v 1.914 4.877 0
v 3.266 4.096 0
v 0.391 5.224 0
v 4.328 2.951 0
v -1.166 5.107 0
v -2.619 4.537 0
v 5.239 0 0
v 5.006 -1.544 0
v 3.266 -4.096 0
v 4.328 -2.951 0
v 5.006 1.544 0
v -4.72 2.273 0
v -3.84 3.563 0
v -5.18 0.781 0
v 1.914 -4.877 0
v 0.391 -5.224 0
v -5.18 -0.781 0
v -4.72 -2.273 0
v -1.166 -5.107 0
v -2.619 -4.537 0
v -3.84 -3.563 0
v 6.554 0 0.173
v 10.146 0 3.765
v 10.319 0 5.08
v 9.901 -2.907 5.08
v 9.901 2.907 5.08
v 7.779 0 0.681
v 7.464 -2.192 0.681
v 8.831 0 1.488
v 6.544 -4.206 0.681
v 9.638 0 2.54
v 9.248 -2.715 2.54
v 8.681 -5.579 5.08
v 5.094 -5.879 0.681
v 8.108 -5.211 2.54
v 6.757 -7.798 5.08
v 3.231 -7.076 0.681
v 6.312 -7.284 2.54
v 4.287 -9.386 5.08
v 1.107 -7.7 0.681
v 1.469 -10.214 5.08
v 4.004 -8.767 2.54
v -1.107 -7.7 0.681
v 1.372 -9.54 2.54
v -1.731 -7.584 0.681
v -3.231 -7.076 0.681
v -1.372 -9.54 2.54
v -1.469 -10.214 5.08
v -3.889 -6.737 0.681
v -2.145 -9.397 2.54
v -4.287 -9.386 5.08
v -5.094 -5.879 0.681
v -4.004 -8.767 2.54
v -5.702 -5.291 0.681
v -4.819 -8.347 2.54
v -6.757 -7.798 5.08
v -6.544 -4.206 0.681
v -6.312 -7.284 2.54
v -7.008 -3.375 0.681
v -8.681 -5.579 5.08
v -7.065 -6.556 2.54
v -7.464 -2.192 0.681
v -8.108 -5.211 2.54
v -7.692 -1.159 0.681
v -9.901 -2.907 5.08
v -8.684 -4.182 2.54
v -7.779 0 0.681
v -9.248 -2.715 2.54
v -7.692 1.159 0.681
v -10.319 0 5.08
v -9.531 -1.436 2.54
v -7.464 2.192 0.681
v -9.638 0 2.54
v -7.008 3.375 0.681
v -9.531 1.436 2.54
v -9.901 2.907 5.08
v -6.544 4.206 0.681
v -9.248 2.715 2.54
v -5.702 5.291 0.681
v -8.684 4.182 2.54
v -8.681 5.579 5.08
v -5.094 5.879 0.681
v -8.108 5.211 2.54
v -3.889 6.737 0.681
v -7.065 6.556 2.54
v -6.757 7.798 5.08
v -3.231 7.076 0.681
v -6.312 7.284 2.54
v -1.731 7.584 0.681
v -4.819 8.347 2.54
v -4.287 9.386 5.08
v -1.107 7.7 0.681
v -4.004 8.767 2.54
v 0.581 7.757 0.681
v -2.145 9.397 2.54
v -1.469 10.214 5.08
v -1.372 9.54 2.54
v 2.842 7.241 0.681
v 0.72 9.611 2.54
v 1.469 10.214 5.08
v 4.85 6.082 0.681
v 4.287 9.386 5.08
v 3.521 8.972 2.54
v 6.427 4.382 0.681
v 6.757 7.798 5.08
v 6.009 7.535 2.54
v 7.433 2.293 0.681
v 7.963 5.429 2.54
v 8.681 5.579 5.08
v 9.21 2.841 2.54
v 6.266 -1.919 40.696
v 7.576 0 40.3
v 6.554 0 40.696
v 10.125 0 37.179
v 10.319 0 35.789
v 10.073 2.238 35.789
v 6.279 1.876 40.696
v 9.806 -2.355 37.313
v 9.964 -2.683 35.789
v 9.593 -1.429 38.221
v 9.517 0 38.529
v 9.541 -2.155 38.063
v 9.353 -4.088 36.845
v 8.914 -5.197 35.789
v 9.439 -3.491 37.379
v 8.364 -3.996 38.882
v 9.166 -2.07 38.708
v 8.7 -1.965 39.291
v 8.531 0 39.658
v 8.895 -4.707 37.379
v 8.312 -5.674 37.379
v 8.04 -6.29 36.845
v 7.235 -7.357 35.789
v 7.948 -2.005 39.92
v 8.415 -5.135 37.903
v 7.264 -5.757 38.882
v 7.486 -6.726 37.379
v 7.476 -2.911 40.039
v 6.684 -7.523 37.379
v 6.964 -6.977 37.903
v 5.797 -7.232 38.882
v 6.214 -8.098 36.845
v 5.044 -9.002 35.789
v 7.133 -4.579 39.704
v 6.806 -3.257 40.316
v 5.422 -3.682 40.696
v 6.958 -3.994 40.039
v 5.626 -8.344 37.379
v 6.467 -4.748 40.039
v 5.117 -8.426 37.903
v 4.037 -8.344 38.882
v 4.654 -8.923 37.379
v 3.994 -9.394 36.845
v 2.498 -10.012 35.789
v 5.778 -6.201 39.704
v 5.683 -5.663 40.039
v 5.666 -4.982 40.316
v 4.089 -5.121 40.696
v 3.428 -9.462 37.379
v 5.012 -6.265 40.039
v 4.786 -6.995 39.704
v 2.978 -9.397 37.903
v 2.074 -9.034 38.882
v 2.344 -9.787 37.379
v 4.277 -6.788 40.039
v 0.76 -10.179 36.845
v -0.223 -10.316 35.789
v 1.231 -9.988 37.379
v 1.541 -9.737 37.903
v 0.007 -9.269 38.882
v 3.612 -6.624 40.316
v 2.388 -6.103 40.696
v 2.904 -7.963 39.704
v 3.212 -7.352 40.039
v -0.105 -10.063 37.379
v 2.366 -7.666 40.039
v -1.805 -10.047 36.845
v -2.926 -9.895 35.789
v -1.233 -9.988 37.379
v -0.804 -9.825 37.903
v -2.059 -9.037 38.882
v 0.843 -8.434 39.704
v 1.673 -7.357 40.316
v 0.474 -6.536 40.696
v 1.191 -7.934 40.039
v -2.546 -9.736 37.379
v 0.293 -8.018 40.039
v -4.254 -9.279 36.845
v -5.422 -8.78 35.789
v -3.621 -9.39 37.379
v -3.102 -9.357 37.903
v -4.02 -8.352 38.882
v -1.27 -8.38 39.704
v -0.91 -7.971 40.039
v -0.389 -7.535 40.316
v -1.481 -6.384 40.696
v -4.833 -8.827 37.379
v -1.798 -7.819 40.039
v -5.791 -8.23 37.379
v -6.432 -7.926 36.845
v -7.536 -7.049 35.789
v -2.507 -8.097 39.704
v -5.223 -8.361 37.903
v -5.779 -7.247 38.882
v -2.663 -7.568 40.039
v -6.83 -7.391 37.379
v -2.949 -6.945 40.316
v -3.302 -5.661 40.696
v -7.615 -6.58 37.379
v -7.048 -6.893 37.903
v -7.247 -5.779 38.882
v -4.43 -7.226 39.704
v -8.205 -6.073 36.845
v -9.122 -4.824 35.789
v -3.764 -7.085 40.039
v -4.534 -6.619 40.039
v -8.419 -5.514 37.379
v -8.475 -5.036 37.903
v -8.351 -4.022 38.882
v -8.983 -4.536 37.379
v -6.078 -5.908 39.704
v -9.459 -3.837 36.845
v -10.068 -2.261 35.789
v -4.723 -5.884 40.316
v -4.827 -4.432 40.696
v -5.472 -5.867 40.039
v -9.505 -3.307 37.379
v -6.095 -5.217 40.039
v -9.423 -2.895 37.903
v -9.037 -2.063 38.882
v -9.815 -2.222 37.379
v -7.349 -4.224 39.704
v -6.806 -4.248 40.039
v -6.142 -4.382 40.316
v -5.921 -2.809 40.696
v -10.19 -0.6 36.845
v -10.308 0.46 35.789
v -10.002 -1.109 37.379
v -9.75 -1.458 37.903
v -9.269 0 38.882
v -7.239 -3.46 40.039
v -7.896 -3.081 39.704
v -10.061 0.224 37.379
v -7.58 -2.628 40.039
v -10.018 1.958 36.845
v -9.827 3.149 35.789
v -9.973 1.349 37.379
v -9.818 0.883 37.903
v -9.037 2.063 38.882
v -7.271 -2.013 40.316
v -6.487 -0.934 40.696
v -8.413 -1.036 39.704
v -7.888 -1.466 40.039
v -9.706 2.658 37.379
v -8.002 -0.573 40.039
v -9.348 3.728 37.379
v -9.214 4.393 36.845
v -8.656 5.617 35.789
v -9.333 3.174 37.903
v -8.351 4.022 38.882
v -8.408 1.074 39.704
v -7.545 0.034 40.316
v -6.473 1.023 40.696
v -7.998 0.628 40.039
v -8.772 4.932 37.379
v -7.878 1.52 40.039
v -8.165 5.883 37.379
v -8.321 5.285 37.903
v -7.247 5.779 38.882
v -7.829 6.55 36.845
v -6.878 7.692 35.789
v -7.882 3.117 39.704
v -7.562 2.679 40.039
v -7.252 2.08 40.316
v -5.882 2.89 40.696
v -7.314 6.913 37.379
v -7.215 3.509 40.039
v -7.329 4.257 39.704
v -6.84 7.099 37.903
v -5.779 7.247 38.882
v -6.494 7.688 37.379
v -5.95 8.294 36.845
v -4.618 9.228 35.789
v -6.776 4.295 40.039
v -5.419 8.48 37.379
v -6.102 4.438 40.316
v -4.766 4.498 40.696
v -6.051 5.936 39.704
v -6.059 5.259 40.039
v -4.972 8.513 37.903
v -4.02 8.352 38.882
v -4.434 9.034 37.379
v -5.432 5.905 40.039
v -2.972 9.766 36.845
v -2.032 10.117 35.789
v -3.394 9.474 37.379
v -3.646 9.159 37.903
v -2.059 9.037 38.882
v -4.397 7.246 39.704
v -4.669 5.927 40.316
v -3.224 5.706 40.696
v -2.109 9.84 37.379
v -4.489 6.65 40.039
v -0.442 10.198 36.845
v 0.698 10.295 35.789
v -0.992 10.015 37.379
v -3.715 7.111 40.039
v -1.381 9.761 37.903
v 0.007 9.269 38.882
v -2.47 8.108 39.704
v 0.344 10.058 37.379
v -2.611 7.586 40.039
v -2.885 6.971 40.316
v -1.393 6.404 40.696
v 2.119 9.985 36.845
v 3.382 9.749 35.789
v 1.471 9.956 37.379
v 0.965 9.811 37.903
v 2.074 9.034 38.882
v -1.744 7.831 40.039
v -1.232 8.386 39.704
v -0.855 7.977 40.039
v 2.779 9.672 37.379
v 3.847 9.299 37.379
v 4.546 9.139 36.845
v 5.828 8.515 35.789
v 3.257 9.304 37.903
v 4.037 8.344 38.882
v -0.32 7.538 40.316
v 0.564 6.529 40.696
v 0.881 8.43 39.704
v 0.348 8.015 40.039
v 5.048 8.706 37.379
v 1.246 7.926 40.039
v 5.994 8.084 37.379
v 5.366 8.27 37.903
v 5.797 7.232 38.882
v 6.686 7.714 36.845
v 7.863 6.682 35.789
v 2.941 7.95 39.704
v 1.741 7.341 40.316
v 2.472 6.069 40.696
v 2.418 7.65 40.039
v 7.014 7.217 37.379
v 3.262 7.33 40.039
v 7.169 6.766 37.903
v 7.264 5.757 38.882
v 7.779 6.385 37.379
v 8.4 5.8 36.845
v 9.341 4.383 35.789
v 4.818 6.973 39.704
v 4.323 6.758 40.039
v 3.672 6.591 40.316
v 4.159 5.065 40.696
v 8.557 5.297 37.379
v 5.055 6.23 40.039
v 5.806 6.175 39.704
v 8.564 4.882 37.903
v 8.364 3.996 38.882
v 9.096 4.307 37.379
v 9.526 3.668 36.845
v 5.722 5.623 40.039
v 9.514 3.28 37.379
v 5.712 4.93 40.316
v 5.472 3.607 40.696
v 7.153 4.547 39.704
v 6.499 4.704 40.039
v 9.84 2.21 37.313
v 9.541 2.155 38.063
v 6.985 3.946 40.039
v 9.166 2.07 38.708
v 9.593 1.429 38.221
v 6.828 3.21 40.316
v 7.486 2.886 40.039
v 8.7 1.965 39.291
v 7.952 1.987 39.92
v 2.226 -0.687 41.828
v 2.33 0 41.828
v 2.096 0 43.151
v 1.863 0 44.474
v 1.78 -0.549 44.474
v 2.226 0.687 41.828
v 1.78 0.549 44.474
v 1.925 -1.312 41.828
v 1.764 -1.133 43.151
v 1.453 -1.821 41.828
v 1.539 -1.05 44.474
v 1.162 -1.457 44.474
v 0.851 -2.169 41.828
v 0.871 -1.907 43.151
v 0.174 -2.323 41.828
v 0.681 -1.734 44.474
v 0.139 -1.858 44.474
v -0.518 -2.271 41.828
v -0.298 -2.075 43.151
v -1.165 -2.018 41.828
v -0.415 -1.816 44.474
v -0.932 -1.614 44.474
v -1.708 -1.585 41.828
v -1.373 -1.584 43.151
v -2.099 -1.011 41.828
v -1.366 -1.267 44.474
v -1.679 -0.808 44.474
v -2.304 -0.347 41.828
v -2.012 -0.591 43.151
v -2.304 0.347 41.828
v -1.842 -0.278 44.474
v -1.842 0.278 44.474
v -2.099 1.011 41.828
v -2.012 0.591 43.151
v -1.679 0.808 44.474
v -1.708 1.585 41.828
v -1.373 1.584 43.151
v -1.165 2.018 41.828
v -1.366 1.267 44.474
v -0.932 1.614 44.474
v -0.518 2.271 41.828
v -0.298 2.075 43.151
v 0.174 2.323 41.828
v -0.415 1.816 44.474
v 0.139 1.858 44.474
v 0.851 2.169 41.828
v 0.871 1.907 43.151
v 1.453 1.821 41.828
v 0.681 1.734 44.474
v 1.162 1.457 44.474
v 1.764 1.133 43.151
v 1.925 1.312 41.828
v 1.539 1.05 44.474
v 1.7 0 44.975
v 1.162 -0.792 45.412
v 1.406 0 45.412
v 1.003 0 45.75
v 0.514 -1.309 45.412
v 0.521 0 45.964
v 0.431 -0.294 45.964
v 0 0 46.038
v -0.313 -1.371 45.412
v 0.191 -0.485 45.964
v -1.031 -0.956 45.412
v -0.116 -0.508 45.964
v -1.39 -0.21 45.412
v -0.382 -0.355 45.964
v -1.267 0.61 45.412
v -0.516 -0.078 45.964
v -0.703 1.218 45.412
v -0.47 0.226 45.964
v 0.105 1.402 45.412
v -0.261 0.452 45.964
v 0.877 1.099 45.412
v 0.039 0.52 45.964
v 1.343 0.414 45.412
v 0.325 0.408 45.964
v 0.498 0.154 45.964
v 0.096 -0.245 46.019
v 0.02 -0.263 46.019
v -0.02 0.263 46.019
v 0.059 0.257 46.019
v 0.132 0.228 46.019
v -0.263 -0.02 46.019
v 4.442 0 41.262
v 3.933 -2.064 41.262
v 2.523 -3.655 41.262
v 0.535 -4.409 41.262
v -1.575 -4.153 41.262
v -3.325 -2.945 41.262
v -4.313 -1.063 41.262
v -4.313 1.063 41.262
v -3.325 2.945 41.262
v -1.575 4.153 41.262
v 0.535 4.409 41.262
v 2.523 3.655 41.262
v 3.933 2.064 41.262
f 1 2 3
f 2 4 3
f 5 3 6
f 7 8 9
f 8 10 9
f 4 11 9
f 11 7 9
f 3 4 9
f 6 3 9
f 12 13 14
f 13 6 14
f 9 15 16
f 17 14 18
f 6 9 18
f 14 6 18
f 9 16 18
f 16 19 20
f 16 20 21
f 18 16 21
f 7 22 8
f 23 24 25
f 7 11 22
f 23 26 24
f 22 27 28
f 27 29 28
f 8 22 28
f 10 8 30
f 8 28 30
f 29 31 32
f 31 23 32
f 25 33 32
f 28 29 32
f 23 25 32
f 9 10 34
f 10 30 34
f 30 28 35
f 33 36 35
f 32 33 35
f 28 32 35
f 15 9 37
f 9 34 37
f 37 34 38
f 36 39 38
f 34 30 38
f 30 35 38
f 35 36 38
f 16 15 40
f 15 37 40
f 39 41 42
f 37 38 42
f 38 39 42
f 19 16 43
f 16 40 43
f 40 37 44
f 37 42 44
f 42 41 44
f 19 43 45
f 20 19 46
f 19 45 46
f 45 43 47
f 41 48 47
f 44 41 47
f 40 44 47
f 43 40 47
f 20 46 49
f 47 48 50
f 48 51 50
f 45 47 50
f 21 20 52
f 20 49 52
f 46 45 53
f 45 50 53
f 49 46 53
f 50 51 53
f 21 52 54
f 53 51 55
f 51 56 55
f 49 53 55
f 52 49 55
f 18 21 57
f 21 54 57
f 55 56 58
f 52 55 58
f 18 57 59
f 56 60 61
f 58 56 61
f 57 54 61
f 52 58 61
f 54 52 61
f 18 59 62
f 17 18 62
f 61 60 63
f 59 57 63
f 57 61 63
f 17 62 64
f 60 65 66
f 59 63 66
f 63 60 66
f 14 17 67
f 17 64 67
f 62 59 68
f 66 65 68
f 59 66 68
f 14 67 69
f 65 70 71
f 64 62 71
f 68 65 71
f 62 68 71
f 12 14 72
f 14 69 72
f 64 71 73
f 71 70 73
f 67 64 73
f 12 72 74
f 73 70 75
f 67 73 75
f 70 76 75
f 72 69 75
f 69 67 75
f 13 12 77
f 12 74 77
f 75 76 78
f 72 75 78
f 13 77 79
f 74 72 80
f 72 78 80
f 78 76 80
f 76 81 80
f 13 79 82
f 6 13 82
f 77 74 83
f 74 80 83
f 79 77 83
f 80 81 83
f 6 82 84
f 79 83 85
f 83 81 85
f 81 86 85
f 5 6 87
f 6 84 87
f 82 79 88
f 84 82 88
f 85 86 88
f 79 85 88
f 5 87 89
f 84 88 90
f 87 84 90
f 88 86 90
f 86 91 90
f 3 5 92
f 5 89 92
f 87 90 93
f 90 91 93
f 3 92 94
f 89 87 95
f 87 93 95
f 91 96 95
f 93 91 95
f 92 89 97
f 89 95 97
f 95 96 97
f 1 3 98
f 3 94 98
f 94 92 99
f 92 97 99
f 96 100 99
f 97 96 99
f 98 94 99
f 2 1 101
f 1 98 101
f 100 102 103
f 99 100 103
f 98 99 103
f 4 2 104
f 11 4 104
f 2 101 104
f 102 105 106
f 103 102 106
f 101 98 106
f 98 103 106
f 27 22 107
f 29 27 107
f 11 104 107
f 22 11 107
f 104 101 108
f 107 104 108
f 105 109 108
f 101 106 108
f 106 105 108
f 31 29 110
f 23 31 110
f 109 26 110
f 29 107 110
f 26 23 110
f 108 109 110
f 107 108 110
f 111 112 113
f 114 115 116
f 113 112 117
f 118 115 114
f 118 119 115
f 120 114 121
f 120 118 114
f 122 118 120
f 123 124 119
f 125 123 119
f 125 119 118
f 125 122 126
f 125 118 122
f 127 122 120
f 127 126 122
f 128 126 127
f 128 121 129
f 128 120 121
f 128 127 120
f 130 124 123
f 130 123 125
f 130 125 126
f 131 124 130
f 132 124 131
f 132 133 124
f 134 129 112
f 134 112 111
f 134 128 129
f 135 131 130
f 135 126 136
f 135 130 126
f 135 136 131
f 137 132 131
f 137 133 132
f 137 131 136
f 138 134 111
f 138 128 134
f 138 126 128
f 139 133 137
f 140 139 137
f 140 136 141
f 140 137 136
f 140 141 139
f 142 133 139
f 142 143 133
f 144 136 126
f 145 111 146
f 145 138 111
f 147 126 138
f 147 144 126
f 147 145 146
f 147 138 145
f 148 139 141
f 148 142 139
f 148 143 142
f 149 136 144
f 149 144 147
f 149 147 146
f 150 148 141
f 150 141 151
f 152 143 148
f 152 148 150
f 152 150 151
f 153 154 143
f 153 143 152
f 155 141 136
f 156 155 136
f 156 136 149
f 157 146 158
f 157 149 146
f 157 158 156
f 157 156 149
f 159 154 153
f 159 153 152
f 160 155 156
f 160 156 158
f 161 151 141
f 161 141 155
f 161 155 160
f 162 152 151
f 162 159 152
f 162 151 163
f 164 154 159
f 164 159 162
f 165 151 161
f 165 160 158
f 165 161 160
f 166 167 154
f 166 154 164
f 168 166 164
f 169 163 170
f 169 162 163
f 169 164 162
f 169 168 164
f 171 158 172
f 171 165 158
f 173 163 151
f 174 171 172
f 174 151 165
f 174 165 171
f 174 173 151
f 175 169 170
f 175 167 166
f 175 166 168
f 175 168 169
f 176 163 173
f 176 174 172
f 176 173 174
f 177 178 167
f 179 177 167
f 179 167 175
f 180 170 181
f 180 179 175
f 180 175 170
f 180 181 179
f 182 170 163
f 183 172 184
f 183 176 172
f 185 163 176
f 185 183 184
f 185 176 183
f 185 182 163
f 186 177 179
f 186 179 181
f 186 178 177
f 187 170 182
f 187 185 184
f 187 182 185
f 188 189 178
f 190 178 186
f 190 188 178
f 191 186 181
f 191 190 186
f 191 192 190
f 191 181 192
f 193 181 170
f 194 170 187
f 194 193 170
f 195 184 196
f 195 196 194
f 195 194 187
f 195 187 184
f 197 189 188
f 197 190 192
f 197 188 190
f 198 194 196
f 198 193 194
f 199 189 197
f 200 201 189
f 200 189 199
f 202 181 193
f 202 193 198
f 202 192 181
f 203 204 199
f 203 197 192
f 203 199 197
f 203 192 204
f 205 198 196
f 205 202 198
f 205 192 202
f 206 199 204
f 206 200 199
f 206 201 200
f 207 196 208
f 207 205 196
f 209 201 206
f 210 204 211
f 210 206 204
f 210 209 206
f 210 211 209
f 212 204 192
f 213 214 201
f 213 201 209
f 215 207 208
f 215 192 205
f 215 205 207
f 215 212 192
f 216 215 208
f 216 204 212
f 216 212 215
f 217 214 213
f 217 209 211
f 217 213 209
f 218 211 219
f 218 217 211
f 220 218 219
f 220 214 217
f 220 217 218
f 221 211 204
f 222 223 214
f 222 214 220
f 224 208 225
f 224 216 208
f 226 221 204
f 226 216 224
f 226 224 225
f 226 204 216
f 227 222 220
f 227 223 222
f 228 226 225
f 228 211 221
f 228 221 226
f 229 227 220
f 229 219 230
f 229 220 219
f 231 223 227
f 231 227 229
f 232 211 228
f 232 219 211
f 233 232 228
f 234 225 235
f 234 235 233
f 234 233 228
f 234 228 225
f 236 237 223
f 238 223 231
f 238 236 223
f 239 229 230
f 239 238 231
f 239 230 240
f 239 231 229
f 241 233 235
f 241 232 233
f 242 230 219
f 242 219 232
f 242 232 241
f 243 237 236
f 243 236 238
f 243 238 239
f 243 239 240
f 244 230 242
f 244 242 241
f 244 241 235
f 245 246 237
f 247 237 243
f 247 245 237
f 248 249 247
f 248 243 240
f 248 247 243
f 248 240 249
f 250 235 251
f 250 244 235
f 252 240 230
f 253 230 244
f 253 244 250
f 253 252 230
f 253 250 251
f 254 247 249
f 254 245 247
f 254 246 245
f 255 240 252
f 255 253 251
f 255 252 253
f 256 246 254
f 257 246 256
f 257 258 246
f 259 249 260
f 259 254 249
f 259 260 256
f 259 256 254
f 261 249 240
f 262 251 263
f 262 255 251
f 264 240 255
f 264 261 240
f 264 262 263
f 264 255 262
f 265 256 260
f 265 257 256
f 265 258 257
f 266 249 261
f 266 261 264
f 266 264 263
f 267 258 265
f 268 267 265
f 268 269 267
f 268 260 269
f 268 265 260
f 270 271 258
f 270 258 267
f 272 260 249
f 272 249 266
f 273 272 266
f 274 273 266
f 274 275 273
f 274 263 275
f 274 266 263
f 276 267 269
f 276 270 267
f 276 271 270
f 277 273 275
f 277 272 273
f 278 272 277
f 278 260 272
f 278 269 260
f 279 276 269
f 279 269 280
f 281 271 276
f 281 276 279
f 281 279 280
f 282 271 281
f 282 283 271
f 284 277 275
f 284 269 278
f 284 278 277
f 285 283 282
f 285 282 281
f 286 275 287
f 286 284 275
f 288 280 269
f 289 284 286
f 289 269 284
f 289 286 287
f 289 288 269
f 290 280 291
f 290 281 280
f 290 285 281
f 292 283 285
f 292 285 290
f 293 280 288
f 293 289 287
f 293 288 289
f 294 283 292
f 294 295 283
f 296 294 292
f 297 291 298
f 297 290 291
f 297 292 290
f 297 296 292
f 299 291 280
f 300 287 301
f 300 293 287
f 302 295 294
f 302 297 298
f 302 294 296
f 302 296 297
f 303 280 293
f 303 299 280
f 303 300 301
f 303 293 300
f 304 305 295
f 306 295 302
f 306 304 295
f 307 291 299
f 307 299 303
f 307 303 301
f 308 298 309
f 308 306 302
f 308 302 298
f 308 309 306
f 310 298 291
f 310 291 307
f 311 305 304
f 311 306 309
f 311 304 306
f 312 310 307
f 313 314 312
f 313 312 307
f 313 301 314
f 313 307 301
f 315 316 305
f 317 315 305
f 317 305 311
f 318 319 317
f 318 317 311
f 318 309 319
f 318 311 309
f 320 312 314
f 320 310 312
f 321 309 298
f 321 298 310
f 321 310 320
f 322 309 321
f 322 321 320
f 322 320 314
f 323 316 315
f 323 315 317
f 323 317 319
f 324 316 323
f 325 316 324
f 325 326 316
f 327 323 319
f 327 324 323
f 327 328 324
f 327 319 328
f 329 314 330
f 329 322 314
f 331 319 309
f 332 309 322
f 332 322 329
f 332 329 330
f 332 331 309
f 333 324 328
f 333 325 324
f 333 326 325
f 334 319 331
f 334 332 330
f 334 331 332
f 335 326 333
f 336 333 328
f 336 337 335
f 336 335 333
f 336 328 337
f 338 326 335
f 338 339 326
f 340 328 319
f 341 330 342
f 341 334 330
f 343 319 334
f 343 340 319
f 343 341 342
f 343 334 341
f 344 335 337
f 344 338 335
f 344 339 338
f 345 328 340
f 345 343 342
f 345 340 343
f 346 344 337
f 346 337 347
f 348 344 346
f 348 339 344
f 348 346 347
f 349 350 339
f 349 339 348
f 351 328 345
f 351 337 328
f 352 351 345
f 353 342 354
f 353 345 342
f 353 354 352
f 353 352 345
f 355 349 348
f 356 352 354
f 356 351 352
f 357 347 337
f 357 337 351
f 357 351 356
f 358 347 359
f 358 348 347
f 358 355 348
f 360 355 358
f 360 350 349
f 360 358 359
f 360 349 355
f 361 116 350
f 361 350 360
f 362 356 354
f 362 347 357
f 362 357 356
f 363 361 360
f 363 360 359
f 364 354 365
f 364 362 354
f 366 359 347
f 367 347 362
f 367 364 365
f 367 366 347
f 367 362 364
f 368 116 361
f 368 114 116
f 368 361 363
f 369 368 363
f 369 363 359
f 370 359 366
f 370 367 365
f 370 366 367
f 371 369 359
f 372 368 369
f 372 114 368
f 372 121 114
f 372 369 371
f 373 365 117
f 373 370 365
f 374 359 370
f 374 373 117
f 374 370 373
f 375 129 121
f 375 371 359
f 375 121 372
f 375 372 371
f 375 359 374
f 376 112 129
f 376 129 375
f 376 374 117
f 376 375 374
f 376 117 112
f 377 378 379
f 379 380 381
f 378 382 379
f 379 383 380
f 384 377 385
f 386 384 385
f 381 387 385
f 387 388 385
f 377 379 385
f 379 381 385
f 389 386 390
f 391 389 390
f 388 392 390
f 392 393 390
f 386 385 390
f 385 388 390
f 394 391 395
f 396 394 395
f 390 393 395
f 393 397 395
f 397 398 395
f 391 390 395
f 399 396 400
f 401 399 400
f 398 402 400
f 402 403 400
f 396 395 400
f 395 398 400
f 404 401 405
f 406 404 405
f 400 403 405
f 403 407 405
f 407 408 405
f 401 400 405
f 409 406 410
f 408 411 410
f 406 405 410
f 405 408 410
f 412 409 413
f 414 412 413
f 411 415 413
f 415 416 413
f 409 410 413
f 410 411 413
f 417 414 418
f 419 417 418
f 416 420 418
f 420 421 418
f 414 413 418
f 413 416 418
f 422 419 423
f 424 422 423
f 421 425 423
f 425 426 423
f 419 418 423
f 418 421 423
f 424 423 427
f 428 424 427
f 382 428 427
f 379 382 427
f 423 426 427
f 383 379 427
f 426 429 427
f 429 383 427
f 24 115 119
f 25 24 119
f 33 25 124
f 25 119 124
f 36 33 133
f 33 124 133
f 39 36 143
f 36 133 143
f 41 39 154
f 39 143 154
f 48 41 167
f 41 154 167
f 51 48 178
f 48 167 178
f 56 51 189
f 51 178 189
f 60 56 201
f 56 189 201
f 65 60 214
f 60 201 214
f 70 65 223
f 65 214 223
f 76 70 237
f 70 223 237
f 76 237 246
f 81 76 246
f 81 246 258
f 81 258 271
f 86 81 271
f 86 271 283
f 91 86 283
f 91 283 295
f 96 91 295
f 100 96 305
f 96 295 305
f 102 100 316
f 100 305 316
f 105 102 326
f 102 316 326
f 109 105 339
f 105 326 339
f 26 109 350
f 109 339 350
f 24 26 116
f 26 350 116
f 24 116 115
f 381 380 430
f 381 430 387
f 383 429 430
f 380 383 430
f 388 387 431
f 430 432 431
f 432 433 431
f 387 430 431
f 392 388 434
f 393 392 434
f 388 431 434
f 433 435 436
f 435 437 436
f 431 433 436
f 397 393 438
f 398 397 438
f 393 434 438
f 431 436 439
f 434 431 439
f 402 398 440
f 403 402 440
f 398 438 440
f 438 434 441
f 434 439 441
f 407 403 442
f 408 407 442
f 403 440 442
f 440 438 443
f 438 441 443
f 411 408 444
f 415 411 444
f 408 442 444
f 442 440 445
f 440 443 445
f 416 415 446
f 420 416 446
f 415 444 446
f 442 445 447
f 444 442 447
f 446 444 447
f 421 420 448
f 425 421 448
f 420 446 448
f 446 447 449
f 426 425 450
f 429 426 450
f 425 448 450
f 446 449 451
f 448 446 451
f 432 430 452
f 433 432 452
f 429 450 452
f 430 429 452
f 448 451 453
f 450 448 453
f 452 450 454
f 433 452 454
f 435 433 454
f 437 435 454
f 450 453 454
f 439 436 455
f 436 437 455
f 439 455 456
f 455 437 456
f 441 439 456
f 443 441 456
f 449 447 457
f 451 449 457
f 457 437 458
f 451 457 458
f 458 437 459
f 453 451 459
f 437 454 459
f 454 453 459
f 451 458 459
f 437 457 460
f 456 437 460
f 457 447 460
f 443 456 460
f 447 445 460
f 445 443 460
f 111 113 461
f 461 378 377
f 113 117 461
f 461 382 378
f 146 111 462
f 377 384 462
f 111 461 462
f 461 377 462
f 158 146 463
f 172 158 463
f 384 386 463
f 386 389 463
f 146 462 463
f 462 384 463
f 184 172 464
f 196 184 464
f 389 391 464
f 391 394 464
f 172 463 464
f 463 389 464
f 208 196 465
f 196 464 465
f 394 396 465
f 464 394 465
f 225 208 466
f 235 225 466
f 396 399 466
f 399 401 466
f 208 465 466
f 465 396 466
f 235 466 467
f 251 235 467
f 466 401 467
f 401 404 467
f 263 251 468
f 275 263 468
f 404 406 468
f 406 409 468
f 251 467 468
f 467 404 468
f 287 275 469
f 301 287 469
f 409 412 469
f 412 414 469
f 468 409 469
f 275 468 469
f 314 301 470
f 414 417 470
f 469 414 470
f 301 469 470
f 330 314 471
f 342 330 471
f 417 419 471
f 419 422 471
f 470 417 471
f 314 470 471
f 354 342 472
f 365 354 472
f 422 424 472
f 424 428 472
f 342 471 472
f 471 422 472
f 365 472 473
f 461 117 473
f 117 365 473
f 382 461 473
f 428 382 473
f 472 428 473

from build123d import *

# Parameters (mm, degrees)
F3_R = 5.08


with BuildPart() as f2:
    # F1 (on Front) → F2 (revolve)
    with BuildSketch(Plane.XZ):
        with BuildLine():
            Line((0, 0), (10.31875, 0))
            Line((10.31875, 0), (10.31875, 39.6875))
            Line((10.31875, 39.6875), (2.329721, 41.828154))
            Line((2.329721, 41.828154), (1.863166, 44.474118))
            ThreePointArc((1.863166, 44.474118), (1.216096, 45.594877), (0, 46.0375))
            Line((0, 46.0375), (0, 0))
        make_face()
    revolve(axis=Axis((0, 0, 23.01875), (0, 0, -1)))

    # F3
    f3_edges = [f2.edges().sort_by_distance(p)[0] for p in [
        (-10.31875, 0, 39.6875),
        (-10.31875, 0, 0),
    ]]
    fillet(f3_edges, radius=F3_R)


solid = f2.part
